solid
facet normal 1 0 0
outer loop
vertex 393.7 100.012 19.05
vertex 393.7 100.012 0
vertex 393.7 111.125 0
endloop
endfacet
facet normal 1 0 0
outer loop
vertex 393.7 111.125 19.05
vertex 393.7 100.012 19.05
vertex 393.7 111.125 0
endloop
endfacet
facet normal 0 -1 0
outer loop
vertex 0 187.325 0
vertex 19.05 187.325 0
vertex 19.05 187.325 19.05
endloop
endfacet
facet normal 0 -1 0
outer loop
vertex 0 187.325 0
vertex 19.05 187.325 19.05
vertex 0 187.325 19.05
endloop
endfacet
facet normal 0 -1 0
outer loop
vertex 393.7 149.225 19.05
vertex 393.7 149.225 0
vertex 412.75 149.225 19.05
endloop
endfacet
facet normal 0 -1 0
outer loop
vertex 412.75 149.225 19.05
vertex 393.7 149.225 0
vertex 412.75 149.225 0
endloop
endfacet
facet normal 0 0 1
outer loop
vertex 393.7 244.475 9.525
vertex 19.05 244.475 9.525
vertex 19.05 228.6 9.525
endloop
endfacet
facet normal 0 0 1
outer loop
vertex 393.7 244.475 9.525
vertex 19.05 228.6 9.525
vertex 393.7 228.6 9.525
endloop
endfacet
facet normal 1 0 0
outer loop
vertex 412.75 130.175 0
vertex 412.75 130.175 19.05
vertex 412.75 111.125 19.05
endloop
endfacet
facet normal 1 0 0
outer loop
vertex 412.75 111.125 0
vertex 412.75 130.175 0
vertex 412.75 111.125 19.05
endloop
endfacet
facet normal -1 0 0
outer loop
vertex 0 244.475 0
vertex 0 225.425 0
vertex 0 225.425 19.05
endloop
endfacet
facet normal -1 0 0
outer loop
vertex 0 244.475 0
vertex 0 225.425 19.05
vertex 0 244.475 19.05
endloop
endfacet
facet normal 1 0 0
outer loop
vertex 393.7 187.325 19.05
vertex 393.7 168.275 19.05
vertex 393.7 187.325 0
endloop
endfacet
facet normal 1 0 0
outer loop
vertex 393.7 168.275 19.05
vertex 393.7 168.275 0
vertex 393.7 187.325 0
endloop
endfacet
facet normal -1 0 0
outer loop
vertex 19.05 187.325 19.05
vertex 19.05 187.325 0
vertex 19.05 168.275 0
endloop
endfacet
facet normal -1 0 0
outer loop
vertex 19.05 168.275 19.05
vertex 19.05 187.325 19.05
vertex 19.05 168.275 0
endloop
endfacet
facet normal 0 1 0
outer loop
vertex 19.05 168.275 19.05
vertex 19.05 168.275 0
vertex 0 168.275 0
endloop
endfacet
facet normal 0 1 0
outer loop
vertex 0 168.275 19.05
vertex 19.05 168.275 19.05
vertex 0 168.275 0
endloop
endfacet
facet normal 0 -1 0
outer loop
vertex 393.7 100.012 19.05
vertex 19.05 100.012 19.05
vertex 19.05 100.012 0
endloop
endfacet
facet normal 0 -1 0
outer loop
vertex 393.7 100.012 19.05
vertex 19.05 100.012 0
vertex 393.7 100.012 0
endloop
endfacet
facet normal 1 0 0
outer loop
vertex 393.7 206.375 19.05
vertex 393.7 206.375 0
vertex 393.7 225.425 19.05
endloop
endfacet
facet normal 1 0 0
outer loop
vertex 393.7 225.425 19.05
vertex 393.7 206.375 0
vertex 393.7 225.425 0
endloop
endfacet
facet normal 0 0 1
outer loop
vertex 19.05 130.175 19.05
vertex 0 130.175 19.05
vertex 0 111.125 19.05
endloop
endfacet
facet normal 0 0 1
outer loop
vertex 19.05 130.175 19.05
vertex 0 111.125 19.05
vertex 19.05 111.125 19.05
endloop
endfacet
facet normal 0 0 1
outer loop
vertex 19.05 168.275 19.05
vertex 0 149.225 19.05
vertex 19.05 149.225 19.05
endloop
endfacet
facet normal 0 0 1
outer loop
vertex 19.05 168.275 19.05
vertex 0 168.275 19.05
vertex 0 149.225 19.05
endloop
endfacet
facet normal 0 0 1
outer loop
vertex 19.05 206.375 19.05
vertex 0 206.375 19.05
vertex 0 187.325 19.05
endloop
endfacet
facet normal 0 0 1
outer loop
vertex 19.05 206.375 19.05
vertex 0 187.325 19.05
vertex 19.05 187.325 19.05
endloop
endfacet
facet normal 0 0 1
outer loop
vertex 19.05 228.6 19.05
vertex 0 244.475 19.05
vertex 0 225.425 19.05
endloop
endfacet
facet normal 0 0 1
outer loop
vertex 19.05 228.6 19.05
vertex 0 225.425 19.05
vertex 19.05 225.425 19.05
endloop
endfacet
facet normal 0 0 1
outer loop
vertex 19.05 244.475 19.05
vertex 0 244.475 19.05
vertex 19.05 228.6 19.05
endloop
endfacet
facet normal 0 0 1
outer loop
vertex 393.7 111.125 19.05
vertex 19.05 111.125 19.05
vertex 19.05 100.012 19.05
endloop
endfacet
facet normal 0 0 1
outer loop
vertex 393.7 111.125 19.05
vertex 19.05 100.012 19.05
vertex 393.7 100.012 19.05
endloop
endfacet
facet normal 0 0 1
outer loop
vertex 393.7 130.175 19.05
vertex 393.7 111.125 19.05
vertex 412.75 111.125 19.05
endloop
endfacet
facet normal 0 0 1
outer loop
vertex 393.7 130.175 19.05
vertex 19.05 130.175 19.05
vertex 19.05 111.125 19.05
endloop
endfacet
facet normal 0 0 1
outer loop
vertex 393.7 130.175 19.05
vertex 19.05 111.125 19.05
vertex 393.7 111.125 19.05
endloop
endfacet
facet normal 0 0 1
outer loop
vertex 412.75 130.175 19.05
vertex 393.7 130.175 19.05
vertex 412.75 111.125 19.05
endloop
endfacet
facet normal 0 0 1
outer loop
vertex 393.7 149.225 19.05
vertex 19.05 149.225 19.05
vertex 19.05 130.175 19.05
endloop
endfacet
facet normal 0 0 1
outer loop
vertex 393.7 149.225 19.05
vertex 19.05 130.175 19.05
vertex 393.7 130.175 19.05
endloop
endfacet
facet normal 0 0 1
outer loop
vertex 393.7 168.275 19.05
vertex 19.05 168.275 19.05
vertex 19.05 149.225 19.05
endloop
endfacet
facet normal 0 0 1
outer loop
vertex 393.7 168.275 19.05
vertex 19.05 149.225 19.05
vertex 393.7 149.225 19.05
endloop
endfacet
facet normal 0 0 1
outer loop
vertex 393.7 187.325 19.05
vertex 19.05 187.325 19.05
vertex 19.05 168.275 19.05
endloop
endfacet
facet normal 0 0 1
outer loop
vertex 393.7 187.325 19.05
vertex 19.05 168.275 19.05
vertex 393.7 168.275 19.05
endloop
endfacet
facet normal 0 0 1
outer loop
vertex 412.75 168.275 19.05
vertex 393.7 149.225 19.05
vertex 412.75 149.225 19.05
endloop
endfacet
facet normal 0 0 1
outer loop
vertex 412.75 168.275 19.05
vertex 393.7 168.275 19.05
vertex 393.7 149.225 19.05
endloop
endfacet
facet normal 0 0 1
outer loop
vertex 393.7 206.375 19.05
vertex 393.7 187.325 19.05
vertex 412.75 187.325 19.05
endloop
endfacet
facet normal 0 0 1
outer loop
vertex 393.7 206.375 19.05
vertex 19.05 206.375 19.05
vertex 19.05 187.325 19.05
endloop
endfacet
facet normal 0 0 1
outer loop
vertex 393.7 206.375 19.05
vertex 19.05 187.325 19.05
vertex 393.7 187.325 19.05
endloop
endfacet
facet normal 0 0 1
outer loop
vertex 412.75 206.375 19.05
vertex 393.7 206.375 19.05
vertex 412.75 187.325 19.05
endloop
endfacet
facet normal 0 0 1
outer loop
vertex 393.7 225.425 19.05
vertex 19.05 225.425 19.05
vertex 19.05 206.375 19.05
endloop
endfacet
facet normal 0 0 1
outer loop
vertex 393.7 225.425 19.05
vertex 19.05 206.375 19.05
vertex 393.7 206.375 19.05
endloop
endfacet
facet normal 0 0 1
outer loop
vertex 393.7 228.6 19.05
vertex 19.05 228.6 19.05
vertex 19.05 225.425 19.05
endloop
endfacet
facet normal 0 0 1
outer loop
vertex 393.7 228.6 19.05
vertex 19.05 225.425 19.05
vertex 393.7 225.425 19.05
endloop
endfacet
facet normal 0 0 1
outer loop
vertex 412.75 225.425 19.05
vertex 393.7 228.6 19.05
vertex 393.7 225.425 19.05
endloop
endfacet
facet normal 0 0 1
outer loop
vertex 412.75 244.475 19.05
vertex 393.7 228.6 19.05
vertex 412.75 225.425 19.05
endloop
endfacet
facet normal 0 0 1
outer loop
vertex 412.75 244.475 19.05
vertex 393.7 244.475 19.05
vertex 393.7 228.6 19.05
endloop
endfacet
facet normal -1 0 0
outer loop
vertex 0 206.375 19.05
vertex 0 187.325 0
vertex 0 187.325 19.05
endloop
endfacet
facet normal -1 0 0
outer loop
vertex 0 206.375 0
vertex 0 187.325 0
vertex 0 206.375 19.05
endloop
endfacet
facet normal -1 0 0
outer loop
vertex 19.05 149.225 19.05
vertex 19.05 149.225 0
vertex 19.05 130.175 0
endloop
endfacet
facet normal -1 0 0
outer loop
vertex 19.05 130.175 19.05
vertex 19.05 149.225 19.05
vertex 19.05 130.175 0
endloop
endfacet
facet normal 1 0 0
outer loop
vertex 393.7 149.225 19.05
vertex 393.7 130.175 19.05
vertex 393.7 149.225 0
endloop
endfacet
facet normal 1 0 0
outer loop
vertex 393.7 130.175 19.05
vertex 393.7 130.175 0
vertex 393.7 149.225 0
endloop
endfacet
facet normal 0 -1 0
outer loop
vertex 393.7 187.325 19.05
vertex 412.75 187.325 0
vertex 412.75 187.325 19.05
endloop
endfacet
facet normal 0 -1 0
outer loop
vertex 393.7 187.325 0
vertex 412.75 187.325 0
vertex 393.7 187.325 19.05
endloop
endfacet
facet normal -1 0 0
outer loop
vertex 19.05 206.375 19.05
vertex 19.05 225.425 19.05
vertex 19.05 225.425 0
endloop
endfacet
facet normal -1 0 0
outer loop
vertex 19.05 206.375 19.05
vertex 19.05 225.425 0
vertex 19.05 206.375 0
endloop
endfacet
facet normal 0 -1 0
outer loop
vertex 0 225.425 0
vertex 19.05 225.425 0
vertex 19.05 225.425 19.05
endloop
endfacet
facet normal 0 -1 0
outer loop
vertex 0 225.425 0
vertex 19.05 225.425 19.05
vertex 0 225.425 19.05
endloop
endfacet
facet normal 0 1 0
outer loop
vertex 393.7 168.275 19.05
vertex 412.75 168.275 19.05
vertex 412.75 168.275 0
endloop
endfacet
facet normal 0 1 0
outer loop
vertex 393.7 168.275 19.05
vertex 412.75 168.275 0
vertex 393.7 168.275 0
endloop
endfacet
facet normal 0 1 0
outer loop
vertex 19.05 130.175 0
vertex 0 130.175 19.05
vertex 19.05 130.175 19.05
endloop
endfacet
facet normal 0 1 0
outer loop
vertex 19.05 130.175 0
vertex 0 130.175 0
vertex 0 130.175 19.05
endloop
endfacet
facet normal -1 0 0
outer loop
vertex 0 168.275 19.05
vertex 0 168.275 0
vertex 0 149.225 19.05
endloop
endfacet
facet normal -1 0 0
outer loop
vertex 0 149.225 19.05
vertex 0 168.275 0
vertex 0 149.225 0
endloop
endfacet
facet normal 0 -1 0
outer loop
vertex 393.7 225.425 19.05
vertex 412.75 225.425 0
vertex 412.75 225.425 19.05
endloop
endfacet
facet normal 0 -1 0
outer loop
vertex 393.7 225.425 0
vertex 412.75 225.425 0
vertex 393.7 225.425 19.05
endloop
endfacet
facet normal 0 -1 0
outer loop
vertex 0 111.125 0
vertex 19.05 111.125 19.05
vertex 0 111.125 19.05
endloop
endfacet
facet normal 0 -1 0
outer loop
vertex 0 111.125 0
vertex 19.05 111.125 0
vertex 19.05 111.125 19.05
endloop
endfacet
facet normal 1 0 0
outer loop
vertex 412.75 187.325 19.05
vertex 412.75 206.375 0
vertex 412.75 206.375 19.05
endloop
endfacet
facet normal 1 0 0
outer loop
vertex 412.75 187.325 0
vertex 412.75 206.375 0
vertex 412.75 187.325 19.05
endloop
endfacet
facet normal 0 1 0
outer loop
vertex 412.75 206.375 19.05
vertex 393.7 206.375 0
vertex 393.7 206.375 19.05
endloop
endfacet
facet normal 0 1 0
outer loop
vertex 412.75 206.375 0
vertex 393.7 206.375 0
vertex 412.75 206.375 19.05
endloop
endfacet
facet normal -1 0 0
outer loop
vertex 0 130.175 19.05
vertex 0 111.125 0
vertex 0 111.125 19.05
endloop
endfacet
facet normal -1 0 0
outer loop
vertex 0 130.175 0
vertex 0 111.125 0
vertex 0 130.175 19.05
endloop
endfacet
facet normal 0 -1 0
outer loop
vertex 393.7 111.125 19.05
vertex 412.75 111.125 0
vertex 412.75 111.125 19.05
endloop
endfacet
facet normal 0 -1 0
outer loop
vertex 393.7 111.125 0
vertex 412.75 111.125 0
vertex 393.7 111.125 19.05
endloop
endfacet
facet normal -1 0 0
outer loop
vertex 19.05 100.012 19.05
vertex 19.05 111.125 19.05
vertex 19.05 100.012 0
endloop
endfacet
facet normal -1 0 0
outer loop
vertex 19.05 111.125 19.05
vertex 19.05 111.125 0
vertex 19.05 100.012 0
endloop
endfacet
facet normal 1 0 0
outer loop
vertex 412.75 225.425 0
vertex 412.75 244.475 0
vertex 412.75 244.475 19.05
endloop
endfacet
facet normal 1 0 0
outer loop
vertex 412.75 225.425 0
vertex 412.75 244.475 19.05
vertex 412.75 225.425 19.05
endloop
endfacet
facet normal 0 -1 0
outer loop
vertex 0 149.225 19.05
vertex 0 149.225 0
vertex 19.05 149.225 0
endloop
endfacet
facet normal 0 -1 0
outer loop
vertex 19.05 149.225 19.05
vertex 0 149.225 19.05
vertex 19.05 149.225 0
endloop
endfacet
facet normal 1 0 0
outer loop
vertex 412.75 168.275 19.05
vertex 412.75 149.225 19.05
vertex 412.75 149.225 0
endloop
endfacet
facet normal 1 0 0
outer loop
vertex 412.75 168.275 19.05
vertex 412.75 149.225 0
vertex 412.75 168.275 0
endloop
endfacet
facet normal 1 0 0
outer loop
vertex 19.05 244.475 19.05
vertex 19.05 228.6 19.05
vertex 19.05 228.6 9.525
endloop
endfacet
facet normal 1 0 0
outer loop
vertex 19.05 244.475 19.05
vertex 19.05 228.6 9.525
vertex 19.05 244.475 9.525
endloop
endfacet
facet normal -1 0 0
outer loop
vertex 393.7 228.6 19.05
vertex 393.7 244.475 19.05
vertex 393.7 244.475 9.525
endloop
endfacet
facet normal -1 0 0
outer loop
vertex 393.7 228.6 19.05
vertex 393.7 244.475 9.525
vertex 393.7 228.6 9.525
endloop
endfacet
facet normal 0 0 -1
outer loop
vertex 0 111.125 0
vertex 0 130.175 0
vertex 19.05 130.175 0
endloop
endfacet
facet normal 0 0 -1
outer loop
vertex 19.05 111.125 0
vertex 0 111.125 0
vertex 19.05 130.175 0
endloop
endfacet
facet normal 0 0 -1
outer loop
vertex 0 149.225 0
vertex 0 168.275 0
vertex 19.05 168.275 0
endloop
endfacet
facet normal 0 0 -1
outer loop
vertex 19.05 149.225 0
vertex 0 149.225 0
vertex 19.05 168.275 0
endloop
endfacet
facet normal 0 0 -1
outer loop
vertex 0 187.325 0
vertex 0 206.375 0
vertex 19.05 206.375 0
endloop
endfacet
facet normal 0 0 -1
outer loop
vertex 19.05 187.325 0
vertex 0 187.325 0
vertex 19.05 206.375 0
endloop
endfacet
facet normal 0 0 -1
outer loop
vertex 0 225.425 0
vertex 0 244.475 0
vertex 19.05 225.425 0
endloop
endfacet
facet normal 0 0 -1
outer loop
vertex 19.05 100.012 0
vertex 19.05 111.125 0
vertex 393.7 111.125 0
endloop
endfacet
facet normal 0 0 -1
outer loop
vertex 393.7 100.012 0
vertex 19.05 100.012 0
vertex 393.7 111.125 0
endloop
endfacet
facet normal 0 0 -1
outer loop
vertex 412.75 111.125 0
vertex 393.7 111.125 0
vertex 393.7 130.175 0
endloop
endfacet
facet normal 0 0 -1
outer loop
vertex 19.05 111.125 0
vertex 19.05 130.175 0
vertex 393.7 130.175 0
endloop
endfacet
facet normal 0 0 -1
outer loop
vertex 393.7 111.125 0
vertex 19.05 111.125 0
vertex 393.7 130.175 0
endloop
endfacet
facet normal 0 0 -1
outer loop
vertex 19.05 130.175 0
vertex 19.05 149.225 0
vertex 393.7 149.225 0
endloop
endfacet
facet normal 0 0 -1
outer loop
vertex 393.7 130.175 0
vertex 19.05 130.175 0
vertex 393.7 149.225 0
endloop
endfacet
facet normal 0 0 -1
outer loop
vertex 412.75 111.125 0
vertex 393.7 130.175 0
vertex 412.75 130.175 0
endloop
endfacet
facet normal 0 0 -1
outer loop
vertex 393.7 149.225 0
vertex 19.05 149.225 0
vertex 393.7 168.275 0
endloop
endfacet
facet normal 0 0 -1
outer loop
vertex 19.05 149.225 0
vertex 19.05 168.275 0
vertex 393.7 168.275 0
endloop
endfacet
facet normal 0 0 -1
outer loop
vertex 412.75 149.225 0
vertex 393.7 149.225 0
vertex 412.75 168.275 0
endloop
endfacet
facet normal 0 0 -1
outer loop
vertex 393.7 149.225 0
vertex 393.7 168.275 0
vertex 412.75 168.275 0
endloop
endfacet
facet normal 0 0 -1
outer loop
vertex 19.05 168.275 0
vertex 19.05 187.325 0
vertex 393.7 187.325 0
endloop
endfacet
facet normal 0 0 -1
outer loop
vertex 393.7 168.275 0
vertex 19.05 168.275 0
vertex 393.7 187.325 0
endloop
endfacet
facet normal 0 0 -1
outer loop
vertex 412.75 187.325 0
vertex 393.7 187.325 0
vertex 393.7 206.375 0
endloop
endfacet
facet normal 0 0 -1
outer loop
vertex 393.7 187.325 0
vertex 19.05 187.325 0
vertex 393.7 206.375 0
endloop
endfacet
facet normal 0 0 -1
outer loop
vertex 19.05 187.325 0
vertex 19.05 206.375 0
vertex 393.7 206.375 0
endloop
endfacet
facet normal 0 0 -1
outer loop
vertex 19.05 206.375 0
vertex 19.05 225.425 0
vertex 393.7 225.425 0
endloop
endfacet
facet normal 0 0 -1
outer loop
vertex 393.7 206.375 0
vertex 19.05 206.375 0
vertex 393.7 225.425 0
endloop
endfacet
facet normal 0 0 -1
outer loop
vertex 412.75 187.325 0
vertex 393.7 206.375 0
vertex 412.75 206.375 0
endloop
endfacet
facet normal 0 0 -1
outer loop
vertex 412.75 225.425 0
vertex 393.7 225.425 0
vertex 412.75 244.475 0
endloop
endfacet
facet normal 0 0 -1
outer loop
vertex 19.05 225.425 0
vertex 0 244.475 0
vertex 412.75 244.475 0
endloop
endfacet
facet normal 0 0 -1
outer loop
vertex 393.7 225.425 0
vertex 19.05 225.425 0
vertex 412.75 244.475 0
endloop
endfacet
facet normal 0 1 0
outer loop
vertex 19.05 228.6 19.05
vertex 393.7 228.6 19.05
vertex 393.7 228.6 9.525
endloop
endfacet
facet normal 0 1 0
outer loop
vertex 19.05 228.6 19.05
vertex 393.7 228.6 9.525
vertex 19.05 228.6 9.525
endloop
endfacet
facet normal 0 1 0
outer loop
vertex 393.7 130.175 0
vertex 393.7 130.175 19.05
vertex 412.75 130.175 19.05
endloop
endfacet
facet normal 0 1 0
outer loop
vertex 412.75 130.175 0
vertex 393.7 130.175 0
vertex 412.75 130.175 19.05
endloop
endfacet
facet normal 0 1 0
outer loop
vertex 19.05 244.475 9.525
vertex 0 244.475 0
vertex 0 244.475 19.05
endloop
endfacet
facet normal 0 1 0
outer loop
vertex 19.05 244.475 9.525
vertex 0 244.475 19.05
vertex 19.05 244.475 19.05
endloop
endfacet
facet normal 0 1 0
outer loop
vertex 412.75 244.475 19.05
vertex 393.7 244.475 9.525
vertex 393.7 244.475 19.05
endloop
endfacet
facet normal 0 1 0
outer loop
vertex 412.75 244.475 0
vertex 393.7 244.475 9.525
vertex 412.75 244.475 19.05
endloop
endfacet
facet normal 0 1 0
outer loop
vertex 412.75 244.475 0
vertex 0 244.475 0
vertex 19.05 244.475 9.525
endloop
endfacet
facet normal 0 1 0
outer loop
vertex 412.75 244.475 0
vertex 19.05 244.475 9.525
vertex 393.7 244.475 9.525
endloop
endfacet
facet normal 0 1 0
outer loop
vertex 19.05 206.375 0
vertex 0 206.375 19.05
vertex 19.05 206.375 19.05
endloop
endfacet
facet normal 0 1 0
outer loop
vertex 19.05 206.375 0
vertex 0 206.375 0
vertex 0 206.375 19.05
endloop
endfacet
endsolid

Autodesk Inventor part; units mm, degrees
ref_plane "YZ Plane" through (0, 0, 0) normal (1, 0, 0) x (0, 1, 0)
ref_plane "XZ Plane" through (0, 0, 0) normal (0, 1, 0) x (-1, 0, 0)
ref_plane "XY Plane" through (0, 0, 0) normal (0, 0, 1) x (1, 0, 0)
sketch "Sketch1" plane through (0, 0, 0) normal (0, 0, 1) x (1, 0, 0)
  line L0 (0, 244.475) -> (19.05, 244.475)
  line L1 (19.05, 244.475) -> (19.05, 225.425)
  line L2 (19.05, 225.425) -> (0, 225.425)
  line L3 (0, 225.425) -> (0, 244.475)
  line L4 (19.05, 168.275) -> (0, 168.275)
  line L5 (0, 168.275) -> (0, 149.225)
  line L6 (0, 149.225) -> (19.05, 149.225)
  line L7 (19.05, 149.225) -> (19.05, 168.275)
  line L8 (0, 130.175) -> (19.05, 130.175)
  line L9 (19.05, 130.175) -> (19.05, 111.125)
  line L10 (19.05, 111.125) -> (0, 111.125)
  line L11 (0, 111.125) -> (0, 130.175)
  line L12 (0, 206.375) -> (19.05, 206.375)
  line L13 (19.05, 206.375) -> (19.05, 187.325)
  line L14 (19.05, 187.325) -> (0, 187.325)
  line L15 (0, 187.325) -> (0, 206.375)
  line L16 (0, 92.075) -> (19.05, 92.075)
  line L17 (19.05, 92.075) -> (19.05, 73.025)
  line L18 (19.05, 73.025) -> (0, 73.025)
  line L19 (0, 73.025) -> (0, 92.075)
  line L20 (0, 53.975) -> (19.05, 53.975)
  line L21 (19.05, 53.975) -> (19.05, 34.925)
  line L22 (19.05, 34.925) -> (0, 34.925)
  line L23 (0, 34.925) -> (0, 53.975)
  line L24 (0, 15.875) -> (19.05, 15.875)
  line L25 (19.05, 15.875) -> (19.05, -3.175)
  line L26 (19.05, -3.175) -> (0, -3.175)
  line L27 (0, -3.175) -> (0, 15.875)
  line L28 (0, 244.475) -> (206.375, 244.475)
  line L29 (206.375, 244.475) -> (206.375, 76.2)
  line L30 (206.375, 76.2) -> (0, 76.2)
  line L31 (19.05, 244.475) -> (19.05, 76.2)
  line L32 (206.375, 244.475) -> (19.05, 244.475)
  line L33 (19.05, 244.475) -> (19.05, 76.2)
  line L34 (19.05, 76.2) -> (206.375, 76.2)
  line L35 (206.375, 76.2) -> (206.375, 244.475)
  line L36 (0, 92.075) -> (19.05, 92.075)
  line L37 (19.05, 92.075) -> (19.05, 76.2)
  line L38 (19.05, 76.2) -> (0, 76.2)
  line L39 (0, 76.2) -> (0, 92.075)
  dimension "d0" = 19.05
  dimension "d1" = 19.05
  dimension "d3" = 19.05
  dimension "d4" = 19.05
  dimension "d5" = 19.05
  dimension "d6" = 19.05
  dimension "d7" = 19.05
  dimension "d8" = 19.05
  dimension "d9" = 19.05
  dimension "d10" = 19.05
  dimension "d11" = 19.05
  dimension "d12" = 19.05
  dimension "d13" = 19.05
  dimension "d14" = 19.05
  dimension "d15" = 19.05
  dimension "d16" = 19.05
  dimension "d17" = 19.05
  dimension "d18" = 19.05
  dimension "d19" = 19.05
  dimension "d21" = 206.375
  dimension "d22" = 168.275
  dimension "d23" = 206.375
extrude "Extrusion3" add sketch "Sketch1" along normal blind 19.05 contours L0 L1 L2 L3 | L28 L29 L30 L17 L31 L9 L7 L13 L1 | L13 L14 L15 L12 | L30 L19 L16 L17 | L7 L6 L5 L4 | L10 L11 L8 L9
mirror "Mirror2" about plane through (206.375, 76.2, 0) normal (1, 0, 0) of "Extrusion3"
sketch "Sketch3" plane through (0, 0, 19.05) normal (0, 0, 1) x (1, 0, 0)
  line L0 (0, 244.475) -> (412.75, 244.475) projected
  line L1 (19.05, 244.475) -> (393.7, 244.475)
  line L2 (393.7, 244.475) -> (393.7, 228.6)
  line L3 (393.7, 228.6) -> (19.05, 228.6)
  line L4 (19.05, 228.6) -> (19.05, 244.475)
  point P0 (0, 0)
  dimension "d33" = 15.875
extrude "Extrusion4" cut sketch "Sketch3" against normal blind 9.525
sketch "Sketch4" plane through (0, 0, 19.05) normal (0, 0, 1) x (1, 0, 0)
  line L0 (0, 244.475) -> (19.05, 244.475) projected
  line L1 (19.05, 111.125) -> (19.05, 92.075) projected
  line L2 (19.05, 92.075) -> (0, 92.075) projected
  line L3 (0, 92.075) -> (0, 76.2) projected
  line L4 (0, 76.2) -> (412.75, 76.2) projected
  line L5 (412.75, 92.075) -> (412.75, 76.2) projected
  line L6 (393.7, 92.075) -> (412.75, 92.075) projected
  line L7 (393.7, 111.125) -> (393.7, 92.075) projected
  line L8 (19.05, 100.0125) -> (393.7, 100.0125)
  point P0 (0, 0)
  dimension "d36" = 144.4625
extrude "Extrusion5" cut sketch "Sketch4" against normal through all
properties part number "deep_end" material "Wood (Birch)"
